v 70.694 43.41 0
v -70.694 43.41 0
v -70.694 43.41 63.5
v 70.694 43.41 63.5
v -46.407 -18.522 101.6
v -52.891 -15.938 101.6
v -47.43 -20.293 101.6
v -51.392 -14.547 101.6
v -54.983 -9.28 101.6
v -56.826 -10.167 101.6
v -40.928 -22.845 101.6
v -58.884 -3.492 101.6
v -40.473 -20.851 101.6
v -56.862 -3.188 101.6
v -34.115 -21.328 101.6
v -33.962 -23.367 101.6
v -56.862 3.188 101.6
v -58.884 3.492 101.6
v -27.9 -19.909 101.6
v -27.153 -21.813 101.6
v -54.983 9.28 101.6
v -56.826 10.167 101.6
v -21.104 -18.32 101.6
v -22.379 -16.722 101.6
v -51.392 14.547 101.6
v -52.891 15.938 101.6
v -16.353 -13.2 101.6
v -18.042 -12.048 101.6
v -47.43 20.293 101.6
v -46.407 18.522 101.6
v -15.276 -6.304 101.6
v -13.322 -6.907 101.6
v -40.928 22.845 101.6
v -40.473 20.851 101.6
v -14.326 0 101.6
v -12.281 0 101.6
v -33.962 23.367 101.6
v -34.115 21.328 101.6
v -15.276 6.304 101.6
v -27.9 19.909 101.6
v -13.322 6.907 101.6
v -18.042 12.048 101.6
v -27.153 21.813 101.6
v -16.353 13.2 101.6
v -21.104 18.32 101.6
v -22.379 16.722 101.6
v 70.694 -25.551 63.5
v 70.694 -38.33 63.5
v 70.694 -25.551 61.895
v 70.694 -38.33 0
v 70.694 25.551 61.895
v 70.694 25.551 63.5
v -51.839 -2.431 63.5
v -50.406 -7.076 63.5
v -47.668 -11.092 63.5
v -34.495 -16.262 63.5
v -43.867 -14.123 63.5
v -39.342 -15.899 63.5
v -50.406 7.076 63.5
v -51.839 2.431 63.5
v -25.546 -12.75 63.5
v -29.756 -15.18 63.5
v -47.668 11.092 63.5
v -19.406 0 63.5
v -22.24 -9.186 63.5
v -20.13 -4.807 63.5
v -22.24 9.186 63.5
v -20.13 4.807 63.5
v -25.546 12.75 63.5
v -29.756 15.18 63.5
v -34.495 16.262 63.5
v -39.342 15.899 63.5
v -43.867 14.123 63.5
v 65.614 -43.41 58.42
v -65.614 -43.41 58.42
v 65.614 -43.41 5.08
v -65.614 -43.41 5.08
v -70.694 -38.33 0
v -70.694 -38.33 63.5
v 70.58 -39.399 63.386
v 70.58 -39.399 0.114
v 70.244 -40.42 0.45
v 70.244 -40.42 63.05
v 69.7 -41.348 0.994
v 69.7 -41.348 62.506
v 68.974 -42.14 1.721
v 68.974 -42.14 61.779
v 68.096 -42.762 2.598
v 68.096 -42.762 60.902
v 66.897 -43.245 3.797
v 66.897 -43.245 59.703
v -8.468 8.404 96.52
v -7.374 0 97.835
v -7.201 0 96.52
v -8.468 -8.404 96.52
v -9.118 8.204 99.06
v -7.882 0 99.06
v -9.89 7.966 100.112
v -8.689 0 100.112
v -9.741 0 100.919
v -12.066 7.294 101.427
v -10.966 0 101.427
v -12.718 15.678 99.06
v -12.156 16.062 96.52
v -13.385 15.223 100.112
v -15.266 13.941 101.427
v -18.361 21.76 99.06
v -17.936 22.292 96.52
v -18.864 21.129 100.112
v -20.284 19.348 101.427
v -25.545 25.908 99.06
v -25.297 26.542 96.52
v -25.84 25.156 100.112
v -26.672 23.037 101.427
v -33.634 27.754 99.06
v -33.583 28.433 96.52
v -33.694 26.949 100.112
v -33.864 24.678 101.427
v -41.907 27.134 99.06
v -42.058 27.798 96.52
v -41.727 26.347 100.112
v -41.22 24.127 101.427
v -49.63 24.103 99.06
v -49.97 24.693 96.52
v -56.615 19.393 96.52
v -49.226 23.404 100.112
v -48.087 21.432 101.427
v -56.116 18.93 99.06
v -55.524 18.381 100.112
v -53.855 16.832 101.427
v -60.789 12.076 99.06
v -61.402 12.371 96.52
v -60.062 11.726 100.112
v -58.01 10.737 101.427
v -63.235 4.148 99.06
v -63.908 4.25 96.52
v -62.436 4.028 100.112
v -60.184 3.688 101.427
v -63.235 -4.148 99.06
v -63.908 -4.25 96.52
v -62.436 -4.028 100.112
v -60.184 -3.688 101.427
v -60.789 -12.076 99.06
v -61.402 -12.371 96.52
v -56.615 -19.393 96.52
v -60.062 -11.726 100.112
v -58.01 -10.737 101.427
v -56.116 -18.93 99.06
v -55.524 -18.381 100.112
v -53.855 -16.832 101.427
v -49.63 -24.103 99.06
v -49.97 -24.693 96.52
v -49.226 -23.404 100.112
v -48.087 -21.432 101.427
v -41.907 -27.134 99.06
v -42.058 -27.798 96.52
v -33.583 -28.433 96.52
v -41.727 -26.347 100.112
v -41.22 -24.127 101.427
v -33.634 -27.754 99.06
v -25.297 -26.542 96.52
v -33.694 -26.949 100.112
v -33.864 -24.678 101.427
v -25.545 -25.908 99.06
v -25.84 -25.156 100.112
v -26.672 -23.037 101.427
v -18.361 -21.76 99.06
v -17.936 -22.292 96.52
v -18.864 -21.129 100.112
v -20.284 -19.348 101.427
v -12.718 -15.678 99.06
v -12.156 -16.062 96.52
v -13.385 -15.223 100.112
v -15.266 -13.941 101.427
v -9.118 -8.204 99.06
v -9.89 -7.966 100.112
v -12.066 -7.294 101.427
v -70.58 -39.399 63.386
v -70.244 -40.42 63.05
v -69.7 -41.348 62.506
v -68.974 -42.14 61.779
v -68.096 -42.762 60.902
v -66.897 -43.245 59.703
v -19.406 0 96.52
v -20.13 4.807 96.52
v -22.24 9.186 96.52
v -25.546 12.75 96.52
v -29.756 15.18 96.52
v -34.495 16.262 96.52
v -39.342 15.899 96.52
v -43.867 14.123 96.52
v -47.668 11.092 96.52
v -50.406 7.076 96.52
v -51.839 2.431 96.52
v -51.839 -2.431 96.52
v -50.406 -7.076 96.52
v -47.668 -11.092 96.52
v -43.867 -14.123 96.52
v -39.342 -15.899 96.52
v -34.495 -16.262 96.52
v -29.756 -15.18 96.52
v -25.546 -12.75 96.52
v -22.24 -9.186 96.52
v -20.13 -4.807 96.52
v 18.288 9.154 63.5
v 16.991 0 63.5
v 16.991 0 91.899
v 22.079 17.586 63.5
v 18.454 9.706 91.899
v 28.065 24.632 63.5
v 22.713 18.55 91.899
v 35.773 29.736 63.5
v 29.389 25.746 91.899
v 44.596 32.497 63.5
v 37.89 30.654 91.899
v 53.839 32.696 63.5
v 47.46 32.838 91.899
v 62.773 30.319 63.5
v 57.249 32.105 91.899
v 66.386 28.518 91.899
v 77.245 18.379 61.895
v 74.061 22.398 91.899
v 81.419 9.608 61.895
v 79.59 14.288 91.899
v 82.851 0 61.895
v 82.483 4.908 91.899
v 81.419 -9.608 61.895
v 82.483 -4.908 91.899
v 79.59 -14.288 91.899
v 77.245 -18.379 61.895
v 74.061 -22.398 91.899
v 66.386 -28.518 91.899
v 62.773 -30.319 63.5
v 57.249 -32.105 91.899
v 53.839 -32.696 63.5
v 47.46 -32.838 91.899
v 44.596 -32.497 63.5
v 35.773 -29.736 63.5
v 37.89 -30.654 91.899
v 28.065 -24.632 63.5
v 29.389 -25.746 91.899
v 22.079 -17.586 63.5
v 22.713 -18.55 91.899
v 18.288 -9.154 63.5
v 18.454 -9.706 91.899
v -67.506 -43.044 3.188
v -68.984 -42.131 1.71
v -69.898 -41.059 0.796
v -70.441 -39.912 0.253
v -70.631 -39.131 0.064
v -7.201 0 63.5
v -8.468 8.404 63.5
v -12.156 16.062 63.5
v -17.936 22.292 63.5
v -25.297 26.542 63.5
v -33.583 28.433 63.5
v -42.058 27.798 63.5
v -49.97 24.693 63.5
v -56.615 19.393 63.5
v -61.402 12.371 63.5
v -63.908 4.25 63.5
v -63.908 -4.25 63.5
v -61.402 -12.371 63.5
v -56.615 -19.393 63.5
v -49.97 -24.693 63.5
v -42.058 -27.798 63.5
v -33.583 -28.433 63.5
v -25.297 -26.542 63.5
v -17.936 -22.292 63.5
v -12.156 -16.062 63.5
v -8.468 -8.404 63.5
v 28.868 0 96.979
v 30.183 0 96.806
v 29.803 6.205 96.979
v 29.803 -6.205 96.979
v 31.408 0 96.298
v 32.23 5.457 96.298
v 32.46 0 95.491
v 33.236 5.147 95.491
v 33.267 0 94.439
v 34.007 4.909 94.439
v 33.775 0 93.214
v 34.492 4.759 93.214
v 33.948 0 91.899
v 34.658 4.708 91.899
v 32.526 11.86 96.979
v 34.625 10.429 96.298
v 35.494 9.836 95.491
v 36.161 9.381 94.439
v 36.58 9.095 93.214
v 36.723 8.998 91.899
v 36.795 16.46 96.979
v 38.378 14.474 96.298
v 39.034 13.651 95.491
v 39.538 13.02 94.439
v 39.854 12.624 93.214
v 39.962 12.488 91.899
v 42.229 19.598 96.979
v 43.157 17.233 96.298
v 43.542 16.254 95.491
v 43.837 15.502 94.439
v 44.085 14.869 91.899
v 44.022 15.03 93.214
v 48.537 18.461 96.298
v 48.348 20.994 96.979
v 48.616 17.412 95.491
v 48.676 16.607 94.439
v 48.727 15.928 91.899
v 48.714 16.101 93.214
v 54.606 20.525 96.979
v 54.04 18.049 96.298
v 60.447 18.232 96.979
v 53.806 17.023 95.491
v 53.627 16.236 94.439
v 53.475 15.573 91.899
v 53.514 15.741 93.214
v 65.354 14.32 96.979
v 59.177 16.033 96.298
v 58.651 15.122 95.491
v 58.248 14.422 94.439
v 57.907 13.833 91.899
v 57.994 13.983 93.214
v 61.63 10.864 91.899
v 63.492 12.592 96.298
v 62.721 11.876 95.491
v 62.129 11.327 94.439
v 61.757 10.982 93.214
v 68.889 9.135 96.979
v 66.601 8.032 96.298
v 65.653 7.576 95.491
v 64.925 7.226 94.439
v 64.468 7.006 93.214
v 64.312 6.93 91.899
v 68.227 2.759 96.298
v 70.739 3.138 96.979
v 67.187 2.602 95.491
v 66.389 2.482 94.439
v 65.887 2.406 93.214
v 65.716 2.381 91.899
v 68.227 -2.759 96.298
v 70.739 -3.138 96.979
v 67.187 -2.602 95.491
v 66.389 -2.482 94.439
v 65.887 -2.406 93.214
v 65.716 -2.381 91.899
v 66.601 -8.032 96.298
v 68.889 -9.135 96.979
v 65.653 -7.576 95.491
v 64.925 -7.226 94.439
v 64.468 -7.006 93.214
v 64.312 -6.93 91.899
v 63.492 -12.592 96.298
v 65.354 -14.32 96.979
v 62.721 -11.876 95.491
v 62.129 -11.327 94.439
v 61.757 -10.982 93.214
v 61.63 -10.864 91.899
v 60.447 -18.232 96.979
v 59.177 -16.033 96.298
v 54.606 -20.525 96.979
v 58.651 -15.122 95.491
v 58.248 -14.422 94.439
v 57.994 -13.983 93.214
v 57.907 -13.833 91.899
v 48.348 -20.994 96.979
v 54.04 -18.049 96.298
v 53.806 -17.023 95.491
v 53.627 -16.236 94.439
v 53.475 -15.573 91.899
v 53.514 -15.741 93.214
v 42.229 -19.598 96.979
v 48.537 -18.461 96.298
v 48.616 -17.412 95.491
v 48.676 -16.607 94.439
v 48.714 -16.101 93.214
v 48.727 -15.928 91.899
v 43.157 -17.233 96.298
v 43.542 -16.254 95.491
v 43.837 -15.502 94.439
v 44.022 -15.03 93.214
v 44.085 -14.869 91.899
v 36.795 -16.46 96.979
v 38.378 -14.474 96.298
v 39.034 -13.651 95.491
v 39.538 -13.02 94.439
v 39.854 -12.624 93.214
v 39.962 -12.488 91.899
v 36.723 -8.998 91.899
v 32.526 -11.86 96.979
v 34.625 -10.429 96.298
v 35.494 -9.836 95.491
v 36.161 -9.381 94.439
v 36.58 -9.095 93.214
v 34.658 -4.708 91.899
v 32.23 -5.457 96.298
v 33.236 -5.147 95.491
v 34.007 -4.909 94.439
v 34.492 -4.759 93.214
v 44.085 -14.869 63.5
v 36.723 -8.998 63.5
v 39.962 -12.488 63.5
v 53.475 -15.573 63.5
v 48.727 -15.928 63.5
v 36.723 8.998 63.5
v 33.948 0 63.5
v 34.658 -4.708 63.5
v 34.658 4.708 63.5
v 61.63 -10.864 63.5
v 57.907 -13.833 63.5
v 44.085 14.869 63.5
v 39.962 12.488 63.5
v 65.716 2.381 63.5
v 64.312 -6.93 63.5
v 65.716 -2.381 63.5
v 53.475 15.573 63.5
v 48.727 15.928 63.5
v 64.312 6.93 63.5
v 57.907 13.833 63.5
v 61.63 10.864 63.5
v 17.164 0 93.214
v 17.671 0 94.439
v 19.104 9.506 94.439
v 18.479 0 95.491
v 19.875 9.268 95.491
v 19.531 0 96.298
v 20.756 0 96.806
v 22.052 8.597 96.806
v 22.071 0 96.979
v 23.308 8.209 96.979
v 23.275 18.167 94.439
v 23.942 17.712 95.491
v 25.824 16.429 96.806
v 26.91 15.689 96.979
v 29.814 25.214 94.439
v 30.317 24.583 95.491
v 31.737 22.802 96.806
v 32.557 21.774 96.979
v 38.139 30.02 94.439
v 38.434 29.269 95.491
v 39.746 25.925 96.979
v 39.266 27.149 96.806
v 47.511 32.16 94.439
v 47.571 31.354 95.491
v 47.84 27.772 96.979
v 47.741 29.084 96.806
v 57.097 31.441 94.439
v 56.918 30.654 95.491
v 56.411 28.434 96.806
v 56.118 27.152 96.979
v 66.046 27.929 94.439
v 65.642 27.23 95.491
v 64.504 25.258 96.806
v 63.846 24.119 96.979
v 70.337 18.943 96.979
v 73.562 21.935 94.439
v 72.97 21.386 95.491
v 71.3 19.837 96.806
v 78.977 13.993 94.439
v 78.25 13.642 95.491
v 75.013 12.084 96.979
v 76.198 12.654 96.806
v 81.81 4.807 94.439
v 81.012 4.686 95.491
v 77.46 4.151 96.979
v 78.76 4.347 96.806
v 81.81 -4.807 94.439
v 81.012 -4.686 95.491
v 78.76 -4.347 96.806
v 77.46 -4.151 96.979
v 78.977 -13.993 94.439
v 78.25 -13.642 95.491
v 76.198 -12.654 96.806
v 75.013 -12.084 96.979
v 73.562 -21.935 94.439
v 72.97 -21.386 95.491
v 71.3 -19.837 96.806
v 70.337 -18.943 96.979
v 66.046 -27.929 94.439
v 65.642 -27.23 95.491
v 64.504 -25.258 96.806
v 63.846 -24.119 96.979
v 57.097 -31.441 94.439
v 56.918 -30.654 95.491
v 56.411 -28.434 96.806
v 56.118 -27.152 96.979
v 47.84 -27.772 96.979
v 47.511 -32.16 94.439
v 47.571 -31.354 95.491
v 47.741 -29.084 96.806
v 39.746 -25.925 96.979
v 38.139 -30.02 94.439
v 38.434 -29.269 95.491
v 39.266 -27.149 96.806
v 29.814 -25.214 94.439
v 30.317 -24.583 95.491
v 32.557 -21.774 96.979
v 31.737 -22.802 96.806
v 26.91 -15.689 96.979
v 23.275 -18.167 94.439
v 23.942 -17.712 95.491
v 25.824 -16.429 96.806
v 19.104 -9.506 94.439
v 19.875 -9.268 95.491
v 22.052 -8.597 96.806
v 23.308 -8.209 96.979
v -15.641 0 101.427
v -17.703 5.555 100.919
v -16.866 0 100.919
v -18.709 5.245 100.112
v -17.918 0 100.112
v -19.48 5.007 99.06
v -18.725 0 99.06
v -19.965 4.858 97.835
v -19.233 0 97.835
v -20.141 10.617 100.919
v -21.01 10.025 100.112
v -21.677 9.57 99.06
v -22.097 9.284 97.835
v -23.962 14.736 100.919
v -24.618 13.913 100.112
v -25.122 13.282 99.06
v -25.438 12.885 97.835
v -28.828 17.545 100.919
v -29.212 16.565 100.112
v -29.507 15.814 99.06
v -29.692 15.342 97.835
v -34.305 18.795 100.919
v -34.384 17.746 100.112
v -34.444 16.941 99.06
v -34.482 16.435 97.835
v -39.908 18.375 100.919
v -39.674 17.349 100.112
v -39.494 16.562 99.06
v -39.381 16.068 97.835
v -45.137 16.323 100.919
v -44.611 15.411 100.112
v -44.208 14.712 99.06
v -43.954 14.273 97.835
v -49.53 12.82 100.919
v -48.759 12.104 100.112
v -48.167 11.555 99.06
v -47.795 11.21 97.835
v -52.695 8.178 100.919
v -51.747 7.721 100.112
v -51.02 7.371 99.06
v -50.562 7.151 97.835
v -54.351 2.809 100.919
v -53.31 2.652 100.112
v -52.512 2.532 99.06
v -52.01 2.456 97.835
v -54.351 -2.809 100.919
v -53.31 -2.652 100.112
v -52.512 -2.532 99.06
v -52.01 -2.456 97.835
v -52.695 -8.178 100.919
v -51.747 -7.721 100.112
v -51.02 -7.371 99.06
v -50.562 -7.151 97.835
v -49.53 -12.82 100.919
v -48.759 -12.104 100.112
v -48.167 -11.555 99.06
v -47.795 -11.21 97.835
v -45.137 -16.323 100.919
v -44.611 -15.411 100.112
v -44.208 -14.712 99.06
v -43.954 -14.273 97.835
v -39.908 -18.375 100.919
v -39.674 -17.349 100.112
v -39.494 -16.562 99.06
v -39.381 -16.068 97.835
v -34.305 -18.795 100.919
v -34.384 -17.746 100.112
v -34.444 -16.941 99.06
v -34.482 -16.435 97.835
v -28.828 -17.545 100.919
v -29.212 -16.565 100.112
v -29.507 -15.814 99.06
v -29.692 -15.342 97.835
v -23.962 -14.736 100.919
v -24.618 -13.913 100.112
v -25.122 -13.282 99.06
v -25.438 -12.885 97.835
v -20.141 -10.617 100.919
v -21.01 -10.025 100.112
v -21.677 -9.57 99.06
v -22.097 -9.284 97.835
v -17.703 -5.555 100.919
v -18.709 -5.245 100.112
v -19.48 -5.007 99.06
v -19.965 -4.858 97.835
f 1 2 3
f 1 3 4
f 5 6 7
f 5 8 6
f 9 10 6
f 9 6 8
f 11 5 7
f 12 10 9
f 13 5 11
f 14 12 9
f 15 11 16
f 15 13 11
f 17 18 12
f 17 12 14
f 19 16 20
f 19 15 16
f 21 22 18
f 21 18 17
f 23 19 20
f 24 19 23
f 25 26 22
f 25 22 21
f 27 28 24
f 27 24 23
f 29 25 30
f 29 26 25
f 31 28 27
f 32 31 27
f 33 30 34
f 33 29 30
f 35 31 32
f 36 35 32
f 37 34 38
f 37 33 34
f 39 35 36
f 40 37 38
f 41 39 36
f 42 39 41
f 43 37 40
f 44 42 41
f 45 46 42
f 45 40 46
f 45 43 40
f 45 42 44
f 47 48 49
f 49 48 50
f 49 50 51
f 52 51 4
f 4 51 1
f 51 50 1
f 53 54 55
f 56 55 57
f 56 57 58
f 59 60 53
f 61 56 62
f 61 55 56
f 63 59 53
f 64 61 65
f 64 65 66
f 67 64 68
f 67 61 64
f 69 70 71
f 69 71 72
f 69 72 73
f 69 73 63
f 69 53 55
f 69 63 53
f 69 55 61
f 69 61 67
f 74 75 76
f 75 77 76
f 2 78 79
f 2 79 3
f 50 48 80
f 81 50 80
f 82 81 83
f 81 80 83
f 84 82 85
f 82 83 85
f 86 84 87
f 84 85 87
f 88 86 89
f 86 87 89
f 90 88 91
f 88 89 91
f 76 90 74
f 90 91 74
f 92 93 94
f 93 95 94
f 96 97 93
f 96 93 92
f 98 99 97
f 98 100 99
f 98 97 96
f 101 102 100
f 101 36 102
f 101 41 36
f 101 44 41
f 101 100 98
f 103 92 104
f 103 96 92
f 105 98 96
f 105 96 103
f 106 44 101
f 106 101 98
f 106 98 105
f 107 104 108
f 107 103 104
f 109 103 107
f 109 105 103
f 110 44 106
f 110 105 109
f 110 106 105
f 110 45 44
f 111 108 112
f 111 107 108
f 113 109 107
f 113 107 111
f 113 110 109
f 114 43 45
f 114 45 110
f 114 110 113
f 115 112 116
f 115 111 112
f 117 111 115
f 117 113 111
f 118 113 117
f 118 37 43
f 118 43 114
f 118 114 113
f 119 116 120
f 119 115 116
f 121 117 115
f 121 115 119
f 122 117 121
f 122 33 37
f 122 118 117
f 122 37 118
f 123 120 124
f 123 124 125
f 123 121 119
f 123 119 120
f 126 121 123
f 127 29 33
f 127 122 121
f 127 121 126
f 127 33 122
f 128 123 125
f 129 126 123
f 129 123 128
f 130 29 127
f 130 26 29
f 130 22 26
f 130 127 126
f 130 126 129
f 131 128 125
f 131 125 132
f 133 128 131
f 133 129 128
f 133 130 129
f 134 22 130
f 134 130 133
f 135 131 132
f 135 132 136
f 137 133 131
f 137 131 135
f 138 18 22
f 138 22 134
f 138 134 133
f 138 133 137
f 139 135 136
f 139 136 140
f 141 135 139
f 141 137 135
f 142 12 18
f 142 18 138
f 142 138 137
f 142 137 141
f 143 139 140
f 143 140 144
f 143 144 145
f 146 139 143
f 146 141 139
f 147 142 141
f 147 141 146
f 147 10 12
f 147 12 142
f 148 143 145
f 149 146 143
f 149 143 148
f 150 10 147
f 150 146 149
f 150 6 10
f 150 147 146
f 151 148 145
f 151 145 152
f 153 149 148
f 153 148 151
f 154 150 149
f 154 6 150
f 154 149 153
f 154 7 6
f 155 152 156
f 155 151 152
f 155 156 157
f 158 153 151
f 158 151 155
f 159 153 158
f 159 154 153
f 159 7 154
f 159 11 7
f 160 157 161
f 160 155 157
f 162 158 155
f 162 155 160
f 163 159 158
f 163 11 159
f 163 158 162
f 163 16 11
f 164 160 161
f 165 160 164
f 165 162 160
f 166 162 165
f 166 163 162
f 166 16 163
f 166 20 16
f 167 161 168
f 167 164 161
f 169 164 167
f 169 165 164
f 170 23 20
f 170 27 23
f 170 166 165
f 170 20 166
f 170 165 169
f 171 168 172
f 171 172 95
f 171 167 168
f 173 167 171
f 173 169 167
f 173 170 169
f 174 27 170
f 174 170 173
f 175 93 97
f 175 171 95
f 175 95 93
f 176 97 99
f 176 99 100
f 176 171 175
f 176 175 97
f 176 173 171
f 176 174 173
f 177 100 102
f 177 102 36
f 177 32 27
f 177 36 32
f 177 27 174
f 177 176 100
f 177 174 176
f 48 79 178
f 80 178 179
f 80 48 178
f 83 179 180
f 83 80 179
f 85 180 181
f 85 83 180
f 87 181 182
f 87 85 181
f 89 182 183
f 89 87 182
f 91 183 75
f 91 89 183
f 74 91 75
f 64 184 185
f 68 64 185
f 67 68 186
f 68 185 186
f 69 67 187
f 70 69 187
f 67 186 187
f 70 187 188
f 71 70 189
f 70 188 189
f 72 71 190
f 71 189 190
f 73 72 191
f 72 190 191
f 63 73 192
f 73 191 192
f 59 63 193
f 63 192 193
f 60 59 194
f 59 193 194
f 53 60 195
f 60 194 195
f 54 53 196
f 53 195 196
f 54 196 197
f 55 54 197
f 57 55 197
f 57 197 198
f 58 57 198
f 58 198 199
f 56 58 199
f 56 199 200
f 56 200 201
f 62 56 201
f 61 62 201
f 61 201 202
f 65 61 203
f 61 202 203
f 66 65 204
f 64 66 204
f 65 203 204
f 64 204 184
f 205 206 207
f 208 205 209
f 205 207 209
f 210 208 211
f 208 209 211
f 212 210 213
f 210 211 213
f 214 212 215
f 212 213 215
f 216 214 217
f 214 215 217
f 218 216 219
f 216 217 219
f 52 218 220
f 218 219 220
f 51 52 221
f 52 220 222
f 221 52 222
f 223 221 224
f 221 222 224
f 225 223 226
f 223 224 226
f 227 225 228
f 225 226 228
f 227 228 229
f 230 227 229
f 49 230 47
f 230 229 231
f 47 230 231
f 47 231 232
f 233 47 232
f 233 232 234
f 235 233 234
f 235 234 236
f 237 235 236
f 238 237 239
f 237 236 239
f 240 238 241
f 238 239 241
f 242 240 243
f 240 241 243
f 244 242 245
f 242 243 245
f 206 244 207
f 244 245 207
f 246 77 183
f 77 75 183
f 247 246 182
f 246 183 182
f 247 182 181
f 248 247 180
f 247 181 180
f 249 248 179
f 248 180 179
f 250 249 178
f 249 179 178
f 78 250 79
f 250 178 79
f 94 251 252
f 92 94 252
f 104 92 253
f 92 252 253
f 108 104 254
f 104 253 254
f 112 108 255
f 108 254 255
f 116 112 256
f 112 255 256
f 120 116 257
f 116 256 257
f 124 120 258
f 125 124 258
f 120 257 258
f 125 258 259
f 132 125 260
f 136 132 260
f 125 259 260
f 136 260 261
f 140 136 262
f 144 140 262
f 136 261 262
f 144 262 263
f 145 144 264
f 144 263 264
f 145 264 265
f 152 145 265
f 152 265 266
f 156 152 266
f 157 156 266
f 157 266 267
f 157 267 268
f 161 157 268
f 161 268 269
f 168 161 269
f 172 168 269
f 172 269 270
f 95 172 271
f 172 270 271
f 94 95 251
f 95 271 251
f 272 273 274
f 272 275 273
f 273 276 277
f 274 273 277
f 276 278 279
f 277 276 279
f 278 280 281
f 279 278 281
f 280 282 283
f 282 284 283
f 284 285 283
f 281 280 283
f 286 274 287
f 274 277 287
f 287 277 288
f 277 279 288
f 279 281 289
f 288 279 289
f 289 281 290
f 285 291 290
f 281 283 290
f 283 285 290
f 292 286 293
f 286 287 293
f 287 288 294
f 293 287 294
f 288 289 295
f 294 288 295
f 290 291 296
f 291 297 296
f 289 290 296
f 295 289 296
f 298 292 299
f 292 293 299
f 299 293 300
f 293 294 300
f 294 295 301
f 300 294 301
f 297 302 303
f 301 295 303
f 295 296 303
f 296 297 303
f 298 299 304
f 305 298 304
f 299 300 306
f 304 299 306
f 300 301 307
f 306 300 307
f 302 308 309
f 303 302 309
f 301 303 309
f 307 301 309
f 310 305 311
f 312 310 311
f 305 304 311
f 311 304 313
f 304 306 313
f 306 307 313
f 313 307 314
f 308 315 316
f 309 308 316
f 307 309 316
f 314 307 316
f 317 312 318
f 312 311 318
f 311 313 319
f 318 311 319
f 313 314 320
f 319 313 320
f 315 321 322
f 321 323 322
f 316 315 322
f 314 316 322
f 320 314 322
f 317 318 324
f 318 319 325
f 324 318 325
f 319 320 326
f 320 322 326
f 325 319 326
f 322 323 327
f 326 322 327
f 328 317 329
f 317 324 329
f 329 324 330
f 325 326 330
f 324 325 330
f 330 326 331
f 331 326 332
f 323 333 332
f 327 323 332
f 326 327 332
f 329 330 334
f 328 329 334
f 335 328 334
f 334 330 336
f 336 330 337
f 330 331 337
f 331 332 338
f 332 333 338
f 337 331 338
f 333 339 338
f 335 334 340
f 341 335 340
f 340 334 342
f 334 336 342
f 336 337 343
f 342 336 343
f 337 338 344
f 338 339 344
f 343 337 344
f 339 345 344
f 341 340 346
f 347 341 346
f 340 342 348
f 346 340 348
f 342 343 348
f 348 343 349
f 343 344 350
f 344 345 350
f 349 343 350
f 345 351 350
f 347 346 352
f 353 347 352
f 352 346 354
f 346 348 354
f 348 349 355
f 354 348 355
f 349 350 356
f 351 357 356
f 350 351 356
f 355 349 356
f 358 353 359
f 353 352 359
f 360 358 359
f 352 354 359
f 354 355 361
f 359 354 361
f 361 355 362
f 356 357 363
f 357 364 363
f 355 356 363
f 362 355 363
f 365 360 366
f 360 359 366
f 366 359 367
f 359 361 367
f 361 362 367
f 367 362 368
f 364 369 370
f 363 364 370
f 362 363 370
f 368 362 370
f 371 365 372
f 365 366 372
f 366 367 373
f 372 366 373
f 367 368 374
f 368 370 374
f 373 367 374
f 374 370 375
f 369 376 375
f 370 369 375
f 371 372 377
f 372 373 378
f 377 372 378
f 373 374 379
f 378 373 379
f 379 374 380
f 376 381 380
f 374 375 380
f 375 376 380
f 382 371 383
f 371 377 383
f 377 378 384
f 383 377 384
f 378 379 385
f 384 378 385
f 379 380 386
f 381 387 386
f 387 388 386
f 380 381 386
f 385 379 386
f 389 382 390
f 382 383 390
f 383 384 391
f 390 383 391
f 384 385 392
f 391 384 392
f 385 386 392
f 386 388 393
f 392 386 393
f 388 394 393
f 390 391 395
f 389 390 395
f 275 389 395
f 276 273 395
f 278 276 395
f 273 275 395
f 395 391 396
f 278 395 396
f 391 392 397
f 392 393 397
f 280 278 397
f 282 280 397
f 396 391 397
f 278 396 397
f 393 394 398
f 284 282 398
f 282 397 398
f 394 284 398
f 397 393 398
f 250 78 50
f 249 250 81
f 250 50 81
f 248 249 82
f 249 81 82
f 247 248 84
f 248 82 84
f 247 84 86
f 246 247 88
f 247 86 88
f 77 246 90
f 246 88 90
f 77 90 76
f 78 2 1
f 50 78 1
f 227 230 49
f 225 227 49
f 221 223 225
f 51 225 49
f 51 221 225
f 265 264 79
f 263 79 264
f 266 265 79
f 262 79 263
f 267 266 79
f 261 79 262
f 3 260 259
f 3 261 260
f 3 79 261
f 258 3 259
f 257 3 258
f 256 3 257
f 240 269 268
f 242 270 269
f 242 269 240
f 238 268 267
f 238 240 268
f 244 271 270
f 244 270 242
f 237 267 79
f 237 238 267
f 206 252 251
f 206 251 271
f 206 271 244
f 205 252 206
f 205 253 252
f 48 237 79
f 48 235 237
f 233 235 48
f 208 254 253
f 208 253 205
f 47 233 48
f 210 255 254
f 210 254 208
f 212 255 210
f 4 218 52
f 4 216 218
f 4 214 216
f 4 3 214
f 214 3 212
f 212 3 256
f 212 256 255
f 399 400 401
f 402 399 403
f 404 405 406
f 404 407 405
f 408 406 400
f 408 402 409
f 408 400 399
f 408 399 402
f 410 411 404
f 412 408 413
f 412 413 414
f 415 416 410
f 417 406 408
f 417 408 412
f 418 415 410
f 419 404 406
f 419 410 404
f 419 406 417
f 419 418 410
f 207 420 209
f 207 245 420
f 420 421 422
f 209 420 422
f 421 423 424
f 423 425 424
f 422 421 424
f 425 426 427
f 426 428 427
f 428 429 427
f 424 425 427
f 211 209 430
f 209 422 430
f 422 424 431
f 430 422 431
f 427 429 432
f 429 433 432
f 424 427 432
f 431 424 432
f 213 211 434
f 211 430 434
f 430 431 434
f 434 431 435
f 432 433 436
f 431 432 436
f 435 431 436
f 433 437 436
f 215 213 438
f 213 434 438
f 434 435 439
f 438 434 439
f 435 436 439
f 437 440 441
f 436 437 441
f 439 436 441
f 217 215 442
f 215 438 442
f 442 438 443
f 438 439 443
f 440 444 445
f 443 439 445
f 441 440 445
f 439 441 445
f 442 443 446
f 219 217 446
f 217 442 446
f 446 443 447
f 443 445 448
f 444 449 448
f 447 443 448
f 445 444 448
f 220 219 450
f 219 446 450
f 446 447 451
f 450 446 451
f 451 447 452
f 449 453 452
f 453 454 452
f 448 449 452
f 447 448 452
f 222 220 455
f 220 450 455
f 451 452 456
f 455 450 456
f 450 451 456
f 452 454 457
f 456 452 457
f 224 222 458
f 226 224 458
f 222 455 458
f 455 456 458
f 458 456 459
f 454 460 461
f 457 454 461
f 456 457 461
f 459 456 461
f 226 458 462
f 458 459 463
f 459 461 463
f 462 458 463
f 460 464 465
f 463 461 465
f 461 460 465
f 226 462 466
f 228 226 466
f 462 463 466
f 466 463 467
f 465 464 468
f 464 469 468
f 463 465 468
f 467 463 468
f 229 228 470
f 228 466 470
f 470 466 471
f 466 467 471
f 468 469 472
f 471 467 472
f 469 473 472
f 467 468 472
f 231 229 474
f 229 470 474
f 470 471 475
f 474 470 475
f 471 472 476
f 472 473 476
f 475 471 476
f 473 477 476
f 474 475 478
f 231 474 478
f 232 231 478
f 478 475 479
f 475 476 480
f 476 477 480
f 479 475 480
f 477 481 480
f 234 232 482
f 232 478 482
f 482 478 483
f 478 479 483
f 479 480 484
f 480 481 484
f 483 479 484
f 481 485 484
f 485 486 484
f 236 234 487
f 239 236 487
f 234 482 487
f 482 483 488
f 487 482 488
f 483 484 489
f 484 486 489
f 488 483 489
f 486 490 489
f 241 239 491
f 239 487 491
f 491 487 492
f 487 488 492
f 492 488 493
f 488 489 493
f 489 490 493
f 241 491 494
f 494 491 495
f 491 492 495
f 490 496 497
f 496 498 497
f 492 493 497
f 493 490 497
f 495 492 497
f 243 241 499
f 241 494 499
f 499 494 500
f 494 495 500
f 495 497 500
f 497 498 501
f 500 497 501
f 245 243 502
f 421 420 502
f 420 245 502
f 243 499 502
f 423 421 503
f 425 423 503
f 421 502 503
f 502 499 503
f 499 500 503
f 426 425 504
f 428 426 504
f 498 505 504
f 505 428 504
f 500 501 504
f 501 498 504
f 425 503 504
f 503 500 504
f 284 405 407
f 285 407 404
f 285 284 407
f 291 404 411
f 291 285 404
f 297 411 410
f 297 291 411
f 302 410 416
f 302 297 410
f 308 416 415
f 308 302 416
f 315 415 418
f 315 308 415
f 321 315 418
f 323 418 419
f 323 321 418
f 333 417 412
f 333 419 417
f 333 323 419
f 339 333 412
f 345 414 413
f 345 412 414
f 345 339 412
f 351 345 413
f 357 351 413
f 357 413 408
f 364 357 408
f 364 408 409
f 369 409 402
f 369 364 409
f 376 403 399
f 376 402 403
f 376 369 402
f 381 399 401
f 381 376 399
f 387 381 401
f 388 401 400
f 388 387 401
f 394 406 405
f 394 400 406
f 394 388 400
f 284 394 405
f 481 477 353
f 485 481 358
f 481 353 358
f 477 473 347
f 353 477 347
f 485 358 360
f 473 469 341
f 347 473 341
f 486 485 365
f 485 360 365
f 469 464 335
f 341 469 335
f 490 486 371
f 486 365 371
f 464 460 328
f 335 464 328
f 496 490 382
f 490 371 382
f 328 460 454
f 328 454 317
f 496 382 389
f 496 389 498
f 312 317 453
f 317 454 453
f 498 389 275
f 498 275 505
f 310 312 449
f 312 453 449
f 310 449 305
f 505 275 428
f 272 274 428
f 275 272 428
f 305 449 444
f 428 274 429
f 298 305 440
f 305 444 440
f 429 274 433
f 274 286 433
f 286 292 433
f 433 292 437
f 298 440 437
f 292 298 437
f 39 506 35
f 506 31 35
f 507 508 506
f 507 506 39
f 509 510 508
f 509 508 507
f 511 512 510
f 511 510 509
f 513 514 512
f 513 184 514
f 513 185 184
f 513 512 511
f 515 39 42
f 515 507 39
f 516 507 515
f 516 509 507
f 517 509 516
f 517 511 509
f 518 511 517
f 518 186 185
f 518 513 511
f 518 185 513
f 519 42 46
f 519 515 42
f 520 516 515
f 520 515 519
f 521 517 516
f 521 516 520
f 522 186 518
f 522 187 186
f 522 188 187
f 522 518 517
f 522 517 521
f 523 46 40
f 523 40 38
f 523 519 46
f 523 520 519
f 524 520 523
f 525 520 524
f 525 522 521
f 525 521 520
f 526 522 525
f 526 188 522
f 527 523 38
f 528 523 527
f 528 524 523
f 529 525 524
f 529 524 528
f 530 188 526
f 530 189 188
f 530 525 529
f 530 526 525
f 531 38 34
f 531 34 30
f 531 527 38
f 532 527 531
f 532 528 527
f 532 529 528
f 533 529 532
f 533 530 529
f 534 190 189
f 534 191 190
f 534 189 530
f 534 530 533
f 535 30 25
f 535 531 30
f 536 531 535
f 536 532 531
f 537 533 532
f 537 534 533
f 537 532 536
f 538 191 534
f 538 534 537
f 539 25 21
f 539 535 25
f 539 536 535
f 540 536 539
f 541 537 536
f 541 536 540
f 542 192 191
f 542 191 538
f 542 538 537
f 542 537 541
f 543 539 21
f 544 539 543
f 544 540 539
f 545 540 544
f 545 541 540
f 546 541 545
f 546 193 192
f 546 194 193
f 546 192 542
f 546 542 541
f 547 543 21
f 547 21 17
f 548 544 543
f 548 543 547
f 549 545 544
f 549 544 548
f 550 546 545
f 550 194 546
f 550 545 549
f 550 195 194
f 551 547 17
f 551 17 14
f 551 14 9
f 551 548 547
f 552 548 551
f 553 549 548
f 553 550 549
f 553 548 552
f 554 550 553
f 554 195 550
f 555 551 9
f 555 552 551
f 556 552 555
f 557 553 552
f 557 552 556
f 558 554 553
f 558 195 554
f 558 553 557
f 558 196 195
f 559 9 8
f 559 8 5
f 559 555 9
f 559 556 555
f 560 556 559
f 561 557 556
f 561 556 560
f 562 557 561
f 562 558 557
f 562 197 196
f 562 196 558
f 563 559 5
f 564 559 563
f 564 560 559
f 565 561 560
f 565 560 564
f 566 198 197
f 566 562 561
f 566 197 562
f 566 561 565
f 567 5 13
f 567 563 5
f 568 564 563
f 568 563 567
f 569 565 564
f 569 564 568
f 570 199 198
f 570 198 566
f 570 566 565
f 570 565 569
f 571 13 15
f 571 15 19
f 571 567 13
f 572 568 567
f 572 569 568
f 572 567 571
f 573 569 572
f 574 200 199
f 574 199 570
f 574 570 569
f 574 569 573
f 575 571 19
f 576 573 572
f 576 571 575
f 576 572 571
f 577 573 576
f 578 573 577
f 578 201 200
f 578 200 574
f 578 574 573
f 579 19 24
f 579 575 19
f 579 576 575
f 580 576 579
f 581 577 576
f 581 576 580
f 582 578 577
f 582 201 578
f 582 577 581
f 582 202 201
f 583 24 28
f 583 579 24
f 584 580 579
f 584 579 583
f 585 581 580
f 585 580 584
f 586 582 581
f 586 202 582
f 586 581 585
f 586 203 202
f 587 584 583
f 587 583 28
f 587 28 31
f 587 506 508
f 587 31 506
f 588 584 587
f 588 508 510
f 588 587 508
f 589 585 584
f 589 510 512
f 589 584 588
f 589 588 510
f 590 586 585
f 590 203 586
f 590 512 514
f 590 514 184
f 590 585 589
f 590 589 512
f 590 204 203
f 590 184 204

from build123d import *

# Parameters (mm, degrees)
F0_W     = 141.3882523775
F0_H     = 86.8192017078
F1_DEPTH = 63.5
F2_R     = 28.5124697473
F3_DEPTH = 38.1
F4_R     = 16.3077330844
F5_DEPTH = 38.1
F6_W     = 16.9572941959
F6_H     = 35.0840575993
F8_R     = 5.08


with BuildPart() as f1:
    # F0 (on Top) → F1 (new body)
    with BuildSketch(Plane.XY):
        Rectangle(F0_W, F0_H)
    extrude(amount=F1_DEPTH)

    # F2 (on face) → F3 (join)
    with BuildSketch(Plane.XY.offset(63.5)):
        with Locations((-35.713609308, 0)):
            Circle(F2_R)
    extrude(amount=F3_DEPTH)

    # F4 (on face) → F5 (cut, through all)
    with BuildSketch(Plane.XY.offset(101.6)):
        with Locations((-35.713609308, 0)):
            Circle(F4_R)
    extrude(amount=-F5_DEPTH, mode=Mode.SUBTRACT)

    # F6 (on Front) → F7 (revolve)
    with BuildSketch(Plane.XZ):
        with Locations((25.4693310708, 79.4370155782)):
            Rectangle(F6_W, F6_H)
    revolve(axis=Axis((49.9209612608, 0, 63.9768075198), (0, 0, -1)))

    # F8
    f8_edges = [f1.edges().sort_by_distance(p)[0] for p in [
        (82.851239, 0, 96.979044),
        (-64.226079, 0, 101.6),
        (65.893944, 0, 96.979044),
        (0, -43.409601, 63.5),
        (70.694126, -43.409601, 31.75),
        (-70.694126, -43.409601, 31.75),
        (0, -43.409601, 0),
        (-52.021342, 0, 101.6),
    ]]
    fillet(f8_edges, radius=F8_R)


solid = f1.part
